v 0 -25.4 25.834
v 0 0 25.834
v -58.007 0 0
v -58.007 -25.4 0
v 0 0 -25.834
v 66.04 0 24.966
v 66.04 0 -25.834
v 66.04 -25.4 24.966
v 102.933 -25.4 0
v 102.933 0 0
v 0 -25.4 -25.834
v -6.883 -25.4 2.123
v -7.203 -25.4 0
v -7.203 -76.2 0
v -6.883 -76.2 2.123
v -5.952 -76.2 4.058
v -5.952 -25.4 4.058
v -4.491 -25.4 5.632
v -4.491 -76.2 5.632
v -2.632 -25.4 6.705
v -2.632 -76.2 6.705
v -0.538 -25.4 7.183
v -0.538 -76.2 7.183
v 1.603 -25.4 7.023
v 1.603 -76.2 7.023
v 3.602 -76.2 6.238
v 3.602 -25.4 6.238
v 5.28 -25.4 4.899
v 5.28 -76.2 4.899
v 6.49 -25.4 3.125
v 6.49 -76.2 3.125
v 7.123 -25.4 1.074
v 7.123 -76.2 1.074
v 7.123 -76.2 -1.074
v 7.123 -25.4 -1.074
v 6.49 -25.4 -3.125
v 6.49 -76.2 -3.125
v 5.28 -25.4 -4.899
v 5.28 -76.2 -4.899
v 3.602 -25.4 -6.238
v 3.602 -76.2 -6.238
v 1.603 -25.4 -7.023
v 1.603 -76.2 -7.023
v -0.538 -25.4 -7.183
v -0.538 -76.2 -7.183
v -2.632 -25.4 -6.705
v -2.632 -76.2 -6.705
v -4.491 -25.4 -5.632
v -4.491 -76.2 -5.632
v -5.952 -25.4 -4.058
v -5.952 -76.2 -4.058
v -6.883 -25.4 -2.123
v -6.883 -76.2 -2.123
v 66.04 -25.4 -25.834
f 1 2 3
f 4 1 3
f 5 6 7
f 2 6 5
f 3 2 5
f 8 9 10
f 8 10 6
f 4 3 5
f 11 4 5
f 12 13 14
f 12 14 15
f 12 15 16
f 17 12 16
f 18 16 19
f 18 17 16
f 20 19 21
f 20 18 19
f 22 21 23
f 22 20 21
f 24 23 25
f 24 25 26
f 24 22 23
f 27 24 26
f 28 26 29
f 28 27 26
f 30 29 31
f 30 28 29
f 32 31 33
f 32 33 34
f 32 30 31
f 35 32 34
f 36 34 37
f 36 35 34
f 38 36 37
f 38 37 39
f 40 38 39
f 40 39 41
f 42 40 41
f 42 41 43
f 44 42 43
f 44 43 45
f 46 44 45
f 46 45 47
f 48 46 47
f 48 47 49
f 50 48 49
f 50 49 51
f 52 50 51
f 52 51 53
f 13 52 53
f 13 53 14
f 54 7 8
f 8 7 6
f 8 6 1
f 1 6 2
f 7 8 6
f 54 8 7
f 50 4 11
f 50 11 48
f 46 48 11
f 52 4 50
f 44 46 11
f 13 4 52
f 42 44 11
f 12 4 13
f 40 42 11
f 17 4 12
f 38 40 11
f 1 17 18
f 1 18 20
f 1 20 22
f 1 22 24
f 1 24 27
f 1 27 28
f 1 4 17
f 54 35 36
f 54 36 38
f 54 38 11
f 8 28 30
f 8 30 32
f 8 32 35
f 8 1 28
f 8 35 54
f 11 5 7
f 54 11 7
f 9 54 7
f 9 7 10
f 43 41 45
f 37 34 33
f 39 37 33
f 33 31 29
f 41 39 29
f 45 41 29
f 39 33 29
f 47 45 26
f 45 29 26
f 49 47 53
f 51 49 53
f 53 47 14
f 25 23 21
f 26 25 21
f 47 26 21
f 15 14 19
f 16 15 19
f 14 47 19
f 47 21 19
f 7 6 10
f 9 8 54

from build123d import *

# Parameters (mm, degrees)
F1_DEPTH = 25.4
F2_R     = 7.203176
F3_DEPTH = 76.2
F5_DEPTH = 25.4


with BuildPart() as f1:
    # F0 (on Front) → F1 (new body)
    with BuildSketch(Plane.XZ):
        Polygon((0, -25.834092), (0, 0), (-58.007324, 0), align=None)
        Polygon((0, 25.834092), (0, 0), (0, -25.834092), (66.04, -25.834092), (66.04, 24.965908), align=None)
        Polygon((-58.007324, 0), (0, 0), (0, 25.834092), align=None)
    extrude(amount=F1_DEPTH)

    # F2 (on face) → F3 (join)
    with BuildSketch(Plane(origin=(0, 0, 0), x_dir=(-1, 0, 0), z_dir=(0, 1, 0))):
        Circle(F2_R)
    extrude(amount=-F3_DEPTH)


with BuildPart() as f5:
    # F4 (on face) → F5 (new body)
    with BuildSketch(Plane.XZ.offset(25.4)):
        Polygon((102.93258, 0), (66.04, 24.965908), (66.04, -25.834092), align=None)
    extrude(amount=-F5_DEPTH)


solid = Compound([f1.part, f5.part])
